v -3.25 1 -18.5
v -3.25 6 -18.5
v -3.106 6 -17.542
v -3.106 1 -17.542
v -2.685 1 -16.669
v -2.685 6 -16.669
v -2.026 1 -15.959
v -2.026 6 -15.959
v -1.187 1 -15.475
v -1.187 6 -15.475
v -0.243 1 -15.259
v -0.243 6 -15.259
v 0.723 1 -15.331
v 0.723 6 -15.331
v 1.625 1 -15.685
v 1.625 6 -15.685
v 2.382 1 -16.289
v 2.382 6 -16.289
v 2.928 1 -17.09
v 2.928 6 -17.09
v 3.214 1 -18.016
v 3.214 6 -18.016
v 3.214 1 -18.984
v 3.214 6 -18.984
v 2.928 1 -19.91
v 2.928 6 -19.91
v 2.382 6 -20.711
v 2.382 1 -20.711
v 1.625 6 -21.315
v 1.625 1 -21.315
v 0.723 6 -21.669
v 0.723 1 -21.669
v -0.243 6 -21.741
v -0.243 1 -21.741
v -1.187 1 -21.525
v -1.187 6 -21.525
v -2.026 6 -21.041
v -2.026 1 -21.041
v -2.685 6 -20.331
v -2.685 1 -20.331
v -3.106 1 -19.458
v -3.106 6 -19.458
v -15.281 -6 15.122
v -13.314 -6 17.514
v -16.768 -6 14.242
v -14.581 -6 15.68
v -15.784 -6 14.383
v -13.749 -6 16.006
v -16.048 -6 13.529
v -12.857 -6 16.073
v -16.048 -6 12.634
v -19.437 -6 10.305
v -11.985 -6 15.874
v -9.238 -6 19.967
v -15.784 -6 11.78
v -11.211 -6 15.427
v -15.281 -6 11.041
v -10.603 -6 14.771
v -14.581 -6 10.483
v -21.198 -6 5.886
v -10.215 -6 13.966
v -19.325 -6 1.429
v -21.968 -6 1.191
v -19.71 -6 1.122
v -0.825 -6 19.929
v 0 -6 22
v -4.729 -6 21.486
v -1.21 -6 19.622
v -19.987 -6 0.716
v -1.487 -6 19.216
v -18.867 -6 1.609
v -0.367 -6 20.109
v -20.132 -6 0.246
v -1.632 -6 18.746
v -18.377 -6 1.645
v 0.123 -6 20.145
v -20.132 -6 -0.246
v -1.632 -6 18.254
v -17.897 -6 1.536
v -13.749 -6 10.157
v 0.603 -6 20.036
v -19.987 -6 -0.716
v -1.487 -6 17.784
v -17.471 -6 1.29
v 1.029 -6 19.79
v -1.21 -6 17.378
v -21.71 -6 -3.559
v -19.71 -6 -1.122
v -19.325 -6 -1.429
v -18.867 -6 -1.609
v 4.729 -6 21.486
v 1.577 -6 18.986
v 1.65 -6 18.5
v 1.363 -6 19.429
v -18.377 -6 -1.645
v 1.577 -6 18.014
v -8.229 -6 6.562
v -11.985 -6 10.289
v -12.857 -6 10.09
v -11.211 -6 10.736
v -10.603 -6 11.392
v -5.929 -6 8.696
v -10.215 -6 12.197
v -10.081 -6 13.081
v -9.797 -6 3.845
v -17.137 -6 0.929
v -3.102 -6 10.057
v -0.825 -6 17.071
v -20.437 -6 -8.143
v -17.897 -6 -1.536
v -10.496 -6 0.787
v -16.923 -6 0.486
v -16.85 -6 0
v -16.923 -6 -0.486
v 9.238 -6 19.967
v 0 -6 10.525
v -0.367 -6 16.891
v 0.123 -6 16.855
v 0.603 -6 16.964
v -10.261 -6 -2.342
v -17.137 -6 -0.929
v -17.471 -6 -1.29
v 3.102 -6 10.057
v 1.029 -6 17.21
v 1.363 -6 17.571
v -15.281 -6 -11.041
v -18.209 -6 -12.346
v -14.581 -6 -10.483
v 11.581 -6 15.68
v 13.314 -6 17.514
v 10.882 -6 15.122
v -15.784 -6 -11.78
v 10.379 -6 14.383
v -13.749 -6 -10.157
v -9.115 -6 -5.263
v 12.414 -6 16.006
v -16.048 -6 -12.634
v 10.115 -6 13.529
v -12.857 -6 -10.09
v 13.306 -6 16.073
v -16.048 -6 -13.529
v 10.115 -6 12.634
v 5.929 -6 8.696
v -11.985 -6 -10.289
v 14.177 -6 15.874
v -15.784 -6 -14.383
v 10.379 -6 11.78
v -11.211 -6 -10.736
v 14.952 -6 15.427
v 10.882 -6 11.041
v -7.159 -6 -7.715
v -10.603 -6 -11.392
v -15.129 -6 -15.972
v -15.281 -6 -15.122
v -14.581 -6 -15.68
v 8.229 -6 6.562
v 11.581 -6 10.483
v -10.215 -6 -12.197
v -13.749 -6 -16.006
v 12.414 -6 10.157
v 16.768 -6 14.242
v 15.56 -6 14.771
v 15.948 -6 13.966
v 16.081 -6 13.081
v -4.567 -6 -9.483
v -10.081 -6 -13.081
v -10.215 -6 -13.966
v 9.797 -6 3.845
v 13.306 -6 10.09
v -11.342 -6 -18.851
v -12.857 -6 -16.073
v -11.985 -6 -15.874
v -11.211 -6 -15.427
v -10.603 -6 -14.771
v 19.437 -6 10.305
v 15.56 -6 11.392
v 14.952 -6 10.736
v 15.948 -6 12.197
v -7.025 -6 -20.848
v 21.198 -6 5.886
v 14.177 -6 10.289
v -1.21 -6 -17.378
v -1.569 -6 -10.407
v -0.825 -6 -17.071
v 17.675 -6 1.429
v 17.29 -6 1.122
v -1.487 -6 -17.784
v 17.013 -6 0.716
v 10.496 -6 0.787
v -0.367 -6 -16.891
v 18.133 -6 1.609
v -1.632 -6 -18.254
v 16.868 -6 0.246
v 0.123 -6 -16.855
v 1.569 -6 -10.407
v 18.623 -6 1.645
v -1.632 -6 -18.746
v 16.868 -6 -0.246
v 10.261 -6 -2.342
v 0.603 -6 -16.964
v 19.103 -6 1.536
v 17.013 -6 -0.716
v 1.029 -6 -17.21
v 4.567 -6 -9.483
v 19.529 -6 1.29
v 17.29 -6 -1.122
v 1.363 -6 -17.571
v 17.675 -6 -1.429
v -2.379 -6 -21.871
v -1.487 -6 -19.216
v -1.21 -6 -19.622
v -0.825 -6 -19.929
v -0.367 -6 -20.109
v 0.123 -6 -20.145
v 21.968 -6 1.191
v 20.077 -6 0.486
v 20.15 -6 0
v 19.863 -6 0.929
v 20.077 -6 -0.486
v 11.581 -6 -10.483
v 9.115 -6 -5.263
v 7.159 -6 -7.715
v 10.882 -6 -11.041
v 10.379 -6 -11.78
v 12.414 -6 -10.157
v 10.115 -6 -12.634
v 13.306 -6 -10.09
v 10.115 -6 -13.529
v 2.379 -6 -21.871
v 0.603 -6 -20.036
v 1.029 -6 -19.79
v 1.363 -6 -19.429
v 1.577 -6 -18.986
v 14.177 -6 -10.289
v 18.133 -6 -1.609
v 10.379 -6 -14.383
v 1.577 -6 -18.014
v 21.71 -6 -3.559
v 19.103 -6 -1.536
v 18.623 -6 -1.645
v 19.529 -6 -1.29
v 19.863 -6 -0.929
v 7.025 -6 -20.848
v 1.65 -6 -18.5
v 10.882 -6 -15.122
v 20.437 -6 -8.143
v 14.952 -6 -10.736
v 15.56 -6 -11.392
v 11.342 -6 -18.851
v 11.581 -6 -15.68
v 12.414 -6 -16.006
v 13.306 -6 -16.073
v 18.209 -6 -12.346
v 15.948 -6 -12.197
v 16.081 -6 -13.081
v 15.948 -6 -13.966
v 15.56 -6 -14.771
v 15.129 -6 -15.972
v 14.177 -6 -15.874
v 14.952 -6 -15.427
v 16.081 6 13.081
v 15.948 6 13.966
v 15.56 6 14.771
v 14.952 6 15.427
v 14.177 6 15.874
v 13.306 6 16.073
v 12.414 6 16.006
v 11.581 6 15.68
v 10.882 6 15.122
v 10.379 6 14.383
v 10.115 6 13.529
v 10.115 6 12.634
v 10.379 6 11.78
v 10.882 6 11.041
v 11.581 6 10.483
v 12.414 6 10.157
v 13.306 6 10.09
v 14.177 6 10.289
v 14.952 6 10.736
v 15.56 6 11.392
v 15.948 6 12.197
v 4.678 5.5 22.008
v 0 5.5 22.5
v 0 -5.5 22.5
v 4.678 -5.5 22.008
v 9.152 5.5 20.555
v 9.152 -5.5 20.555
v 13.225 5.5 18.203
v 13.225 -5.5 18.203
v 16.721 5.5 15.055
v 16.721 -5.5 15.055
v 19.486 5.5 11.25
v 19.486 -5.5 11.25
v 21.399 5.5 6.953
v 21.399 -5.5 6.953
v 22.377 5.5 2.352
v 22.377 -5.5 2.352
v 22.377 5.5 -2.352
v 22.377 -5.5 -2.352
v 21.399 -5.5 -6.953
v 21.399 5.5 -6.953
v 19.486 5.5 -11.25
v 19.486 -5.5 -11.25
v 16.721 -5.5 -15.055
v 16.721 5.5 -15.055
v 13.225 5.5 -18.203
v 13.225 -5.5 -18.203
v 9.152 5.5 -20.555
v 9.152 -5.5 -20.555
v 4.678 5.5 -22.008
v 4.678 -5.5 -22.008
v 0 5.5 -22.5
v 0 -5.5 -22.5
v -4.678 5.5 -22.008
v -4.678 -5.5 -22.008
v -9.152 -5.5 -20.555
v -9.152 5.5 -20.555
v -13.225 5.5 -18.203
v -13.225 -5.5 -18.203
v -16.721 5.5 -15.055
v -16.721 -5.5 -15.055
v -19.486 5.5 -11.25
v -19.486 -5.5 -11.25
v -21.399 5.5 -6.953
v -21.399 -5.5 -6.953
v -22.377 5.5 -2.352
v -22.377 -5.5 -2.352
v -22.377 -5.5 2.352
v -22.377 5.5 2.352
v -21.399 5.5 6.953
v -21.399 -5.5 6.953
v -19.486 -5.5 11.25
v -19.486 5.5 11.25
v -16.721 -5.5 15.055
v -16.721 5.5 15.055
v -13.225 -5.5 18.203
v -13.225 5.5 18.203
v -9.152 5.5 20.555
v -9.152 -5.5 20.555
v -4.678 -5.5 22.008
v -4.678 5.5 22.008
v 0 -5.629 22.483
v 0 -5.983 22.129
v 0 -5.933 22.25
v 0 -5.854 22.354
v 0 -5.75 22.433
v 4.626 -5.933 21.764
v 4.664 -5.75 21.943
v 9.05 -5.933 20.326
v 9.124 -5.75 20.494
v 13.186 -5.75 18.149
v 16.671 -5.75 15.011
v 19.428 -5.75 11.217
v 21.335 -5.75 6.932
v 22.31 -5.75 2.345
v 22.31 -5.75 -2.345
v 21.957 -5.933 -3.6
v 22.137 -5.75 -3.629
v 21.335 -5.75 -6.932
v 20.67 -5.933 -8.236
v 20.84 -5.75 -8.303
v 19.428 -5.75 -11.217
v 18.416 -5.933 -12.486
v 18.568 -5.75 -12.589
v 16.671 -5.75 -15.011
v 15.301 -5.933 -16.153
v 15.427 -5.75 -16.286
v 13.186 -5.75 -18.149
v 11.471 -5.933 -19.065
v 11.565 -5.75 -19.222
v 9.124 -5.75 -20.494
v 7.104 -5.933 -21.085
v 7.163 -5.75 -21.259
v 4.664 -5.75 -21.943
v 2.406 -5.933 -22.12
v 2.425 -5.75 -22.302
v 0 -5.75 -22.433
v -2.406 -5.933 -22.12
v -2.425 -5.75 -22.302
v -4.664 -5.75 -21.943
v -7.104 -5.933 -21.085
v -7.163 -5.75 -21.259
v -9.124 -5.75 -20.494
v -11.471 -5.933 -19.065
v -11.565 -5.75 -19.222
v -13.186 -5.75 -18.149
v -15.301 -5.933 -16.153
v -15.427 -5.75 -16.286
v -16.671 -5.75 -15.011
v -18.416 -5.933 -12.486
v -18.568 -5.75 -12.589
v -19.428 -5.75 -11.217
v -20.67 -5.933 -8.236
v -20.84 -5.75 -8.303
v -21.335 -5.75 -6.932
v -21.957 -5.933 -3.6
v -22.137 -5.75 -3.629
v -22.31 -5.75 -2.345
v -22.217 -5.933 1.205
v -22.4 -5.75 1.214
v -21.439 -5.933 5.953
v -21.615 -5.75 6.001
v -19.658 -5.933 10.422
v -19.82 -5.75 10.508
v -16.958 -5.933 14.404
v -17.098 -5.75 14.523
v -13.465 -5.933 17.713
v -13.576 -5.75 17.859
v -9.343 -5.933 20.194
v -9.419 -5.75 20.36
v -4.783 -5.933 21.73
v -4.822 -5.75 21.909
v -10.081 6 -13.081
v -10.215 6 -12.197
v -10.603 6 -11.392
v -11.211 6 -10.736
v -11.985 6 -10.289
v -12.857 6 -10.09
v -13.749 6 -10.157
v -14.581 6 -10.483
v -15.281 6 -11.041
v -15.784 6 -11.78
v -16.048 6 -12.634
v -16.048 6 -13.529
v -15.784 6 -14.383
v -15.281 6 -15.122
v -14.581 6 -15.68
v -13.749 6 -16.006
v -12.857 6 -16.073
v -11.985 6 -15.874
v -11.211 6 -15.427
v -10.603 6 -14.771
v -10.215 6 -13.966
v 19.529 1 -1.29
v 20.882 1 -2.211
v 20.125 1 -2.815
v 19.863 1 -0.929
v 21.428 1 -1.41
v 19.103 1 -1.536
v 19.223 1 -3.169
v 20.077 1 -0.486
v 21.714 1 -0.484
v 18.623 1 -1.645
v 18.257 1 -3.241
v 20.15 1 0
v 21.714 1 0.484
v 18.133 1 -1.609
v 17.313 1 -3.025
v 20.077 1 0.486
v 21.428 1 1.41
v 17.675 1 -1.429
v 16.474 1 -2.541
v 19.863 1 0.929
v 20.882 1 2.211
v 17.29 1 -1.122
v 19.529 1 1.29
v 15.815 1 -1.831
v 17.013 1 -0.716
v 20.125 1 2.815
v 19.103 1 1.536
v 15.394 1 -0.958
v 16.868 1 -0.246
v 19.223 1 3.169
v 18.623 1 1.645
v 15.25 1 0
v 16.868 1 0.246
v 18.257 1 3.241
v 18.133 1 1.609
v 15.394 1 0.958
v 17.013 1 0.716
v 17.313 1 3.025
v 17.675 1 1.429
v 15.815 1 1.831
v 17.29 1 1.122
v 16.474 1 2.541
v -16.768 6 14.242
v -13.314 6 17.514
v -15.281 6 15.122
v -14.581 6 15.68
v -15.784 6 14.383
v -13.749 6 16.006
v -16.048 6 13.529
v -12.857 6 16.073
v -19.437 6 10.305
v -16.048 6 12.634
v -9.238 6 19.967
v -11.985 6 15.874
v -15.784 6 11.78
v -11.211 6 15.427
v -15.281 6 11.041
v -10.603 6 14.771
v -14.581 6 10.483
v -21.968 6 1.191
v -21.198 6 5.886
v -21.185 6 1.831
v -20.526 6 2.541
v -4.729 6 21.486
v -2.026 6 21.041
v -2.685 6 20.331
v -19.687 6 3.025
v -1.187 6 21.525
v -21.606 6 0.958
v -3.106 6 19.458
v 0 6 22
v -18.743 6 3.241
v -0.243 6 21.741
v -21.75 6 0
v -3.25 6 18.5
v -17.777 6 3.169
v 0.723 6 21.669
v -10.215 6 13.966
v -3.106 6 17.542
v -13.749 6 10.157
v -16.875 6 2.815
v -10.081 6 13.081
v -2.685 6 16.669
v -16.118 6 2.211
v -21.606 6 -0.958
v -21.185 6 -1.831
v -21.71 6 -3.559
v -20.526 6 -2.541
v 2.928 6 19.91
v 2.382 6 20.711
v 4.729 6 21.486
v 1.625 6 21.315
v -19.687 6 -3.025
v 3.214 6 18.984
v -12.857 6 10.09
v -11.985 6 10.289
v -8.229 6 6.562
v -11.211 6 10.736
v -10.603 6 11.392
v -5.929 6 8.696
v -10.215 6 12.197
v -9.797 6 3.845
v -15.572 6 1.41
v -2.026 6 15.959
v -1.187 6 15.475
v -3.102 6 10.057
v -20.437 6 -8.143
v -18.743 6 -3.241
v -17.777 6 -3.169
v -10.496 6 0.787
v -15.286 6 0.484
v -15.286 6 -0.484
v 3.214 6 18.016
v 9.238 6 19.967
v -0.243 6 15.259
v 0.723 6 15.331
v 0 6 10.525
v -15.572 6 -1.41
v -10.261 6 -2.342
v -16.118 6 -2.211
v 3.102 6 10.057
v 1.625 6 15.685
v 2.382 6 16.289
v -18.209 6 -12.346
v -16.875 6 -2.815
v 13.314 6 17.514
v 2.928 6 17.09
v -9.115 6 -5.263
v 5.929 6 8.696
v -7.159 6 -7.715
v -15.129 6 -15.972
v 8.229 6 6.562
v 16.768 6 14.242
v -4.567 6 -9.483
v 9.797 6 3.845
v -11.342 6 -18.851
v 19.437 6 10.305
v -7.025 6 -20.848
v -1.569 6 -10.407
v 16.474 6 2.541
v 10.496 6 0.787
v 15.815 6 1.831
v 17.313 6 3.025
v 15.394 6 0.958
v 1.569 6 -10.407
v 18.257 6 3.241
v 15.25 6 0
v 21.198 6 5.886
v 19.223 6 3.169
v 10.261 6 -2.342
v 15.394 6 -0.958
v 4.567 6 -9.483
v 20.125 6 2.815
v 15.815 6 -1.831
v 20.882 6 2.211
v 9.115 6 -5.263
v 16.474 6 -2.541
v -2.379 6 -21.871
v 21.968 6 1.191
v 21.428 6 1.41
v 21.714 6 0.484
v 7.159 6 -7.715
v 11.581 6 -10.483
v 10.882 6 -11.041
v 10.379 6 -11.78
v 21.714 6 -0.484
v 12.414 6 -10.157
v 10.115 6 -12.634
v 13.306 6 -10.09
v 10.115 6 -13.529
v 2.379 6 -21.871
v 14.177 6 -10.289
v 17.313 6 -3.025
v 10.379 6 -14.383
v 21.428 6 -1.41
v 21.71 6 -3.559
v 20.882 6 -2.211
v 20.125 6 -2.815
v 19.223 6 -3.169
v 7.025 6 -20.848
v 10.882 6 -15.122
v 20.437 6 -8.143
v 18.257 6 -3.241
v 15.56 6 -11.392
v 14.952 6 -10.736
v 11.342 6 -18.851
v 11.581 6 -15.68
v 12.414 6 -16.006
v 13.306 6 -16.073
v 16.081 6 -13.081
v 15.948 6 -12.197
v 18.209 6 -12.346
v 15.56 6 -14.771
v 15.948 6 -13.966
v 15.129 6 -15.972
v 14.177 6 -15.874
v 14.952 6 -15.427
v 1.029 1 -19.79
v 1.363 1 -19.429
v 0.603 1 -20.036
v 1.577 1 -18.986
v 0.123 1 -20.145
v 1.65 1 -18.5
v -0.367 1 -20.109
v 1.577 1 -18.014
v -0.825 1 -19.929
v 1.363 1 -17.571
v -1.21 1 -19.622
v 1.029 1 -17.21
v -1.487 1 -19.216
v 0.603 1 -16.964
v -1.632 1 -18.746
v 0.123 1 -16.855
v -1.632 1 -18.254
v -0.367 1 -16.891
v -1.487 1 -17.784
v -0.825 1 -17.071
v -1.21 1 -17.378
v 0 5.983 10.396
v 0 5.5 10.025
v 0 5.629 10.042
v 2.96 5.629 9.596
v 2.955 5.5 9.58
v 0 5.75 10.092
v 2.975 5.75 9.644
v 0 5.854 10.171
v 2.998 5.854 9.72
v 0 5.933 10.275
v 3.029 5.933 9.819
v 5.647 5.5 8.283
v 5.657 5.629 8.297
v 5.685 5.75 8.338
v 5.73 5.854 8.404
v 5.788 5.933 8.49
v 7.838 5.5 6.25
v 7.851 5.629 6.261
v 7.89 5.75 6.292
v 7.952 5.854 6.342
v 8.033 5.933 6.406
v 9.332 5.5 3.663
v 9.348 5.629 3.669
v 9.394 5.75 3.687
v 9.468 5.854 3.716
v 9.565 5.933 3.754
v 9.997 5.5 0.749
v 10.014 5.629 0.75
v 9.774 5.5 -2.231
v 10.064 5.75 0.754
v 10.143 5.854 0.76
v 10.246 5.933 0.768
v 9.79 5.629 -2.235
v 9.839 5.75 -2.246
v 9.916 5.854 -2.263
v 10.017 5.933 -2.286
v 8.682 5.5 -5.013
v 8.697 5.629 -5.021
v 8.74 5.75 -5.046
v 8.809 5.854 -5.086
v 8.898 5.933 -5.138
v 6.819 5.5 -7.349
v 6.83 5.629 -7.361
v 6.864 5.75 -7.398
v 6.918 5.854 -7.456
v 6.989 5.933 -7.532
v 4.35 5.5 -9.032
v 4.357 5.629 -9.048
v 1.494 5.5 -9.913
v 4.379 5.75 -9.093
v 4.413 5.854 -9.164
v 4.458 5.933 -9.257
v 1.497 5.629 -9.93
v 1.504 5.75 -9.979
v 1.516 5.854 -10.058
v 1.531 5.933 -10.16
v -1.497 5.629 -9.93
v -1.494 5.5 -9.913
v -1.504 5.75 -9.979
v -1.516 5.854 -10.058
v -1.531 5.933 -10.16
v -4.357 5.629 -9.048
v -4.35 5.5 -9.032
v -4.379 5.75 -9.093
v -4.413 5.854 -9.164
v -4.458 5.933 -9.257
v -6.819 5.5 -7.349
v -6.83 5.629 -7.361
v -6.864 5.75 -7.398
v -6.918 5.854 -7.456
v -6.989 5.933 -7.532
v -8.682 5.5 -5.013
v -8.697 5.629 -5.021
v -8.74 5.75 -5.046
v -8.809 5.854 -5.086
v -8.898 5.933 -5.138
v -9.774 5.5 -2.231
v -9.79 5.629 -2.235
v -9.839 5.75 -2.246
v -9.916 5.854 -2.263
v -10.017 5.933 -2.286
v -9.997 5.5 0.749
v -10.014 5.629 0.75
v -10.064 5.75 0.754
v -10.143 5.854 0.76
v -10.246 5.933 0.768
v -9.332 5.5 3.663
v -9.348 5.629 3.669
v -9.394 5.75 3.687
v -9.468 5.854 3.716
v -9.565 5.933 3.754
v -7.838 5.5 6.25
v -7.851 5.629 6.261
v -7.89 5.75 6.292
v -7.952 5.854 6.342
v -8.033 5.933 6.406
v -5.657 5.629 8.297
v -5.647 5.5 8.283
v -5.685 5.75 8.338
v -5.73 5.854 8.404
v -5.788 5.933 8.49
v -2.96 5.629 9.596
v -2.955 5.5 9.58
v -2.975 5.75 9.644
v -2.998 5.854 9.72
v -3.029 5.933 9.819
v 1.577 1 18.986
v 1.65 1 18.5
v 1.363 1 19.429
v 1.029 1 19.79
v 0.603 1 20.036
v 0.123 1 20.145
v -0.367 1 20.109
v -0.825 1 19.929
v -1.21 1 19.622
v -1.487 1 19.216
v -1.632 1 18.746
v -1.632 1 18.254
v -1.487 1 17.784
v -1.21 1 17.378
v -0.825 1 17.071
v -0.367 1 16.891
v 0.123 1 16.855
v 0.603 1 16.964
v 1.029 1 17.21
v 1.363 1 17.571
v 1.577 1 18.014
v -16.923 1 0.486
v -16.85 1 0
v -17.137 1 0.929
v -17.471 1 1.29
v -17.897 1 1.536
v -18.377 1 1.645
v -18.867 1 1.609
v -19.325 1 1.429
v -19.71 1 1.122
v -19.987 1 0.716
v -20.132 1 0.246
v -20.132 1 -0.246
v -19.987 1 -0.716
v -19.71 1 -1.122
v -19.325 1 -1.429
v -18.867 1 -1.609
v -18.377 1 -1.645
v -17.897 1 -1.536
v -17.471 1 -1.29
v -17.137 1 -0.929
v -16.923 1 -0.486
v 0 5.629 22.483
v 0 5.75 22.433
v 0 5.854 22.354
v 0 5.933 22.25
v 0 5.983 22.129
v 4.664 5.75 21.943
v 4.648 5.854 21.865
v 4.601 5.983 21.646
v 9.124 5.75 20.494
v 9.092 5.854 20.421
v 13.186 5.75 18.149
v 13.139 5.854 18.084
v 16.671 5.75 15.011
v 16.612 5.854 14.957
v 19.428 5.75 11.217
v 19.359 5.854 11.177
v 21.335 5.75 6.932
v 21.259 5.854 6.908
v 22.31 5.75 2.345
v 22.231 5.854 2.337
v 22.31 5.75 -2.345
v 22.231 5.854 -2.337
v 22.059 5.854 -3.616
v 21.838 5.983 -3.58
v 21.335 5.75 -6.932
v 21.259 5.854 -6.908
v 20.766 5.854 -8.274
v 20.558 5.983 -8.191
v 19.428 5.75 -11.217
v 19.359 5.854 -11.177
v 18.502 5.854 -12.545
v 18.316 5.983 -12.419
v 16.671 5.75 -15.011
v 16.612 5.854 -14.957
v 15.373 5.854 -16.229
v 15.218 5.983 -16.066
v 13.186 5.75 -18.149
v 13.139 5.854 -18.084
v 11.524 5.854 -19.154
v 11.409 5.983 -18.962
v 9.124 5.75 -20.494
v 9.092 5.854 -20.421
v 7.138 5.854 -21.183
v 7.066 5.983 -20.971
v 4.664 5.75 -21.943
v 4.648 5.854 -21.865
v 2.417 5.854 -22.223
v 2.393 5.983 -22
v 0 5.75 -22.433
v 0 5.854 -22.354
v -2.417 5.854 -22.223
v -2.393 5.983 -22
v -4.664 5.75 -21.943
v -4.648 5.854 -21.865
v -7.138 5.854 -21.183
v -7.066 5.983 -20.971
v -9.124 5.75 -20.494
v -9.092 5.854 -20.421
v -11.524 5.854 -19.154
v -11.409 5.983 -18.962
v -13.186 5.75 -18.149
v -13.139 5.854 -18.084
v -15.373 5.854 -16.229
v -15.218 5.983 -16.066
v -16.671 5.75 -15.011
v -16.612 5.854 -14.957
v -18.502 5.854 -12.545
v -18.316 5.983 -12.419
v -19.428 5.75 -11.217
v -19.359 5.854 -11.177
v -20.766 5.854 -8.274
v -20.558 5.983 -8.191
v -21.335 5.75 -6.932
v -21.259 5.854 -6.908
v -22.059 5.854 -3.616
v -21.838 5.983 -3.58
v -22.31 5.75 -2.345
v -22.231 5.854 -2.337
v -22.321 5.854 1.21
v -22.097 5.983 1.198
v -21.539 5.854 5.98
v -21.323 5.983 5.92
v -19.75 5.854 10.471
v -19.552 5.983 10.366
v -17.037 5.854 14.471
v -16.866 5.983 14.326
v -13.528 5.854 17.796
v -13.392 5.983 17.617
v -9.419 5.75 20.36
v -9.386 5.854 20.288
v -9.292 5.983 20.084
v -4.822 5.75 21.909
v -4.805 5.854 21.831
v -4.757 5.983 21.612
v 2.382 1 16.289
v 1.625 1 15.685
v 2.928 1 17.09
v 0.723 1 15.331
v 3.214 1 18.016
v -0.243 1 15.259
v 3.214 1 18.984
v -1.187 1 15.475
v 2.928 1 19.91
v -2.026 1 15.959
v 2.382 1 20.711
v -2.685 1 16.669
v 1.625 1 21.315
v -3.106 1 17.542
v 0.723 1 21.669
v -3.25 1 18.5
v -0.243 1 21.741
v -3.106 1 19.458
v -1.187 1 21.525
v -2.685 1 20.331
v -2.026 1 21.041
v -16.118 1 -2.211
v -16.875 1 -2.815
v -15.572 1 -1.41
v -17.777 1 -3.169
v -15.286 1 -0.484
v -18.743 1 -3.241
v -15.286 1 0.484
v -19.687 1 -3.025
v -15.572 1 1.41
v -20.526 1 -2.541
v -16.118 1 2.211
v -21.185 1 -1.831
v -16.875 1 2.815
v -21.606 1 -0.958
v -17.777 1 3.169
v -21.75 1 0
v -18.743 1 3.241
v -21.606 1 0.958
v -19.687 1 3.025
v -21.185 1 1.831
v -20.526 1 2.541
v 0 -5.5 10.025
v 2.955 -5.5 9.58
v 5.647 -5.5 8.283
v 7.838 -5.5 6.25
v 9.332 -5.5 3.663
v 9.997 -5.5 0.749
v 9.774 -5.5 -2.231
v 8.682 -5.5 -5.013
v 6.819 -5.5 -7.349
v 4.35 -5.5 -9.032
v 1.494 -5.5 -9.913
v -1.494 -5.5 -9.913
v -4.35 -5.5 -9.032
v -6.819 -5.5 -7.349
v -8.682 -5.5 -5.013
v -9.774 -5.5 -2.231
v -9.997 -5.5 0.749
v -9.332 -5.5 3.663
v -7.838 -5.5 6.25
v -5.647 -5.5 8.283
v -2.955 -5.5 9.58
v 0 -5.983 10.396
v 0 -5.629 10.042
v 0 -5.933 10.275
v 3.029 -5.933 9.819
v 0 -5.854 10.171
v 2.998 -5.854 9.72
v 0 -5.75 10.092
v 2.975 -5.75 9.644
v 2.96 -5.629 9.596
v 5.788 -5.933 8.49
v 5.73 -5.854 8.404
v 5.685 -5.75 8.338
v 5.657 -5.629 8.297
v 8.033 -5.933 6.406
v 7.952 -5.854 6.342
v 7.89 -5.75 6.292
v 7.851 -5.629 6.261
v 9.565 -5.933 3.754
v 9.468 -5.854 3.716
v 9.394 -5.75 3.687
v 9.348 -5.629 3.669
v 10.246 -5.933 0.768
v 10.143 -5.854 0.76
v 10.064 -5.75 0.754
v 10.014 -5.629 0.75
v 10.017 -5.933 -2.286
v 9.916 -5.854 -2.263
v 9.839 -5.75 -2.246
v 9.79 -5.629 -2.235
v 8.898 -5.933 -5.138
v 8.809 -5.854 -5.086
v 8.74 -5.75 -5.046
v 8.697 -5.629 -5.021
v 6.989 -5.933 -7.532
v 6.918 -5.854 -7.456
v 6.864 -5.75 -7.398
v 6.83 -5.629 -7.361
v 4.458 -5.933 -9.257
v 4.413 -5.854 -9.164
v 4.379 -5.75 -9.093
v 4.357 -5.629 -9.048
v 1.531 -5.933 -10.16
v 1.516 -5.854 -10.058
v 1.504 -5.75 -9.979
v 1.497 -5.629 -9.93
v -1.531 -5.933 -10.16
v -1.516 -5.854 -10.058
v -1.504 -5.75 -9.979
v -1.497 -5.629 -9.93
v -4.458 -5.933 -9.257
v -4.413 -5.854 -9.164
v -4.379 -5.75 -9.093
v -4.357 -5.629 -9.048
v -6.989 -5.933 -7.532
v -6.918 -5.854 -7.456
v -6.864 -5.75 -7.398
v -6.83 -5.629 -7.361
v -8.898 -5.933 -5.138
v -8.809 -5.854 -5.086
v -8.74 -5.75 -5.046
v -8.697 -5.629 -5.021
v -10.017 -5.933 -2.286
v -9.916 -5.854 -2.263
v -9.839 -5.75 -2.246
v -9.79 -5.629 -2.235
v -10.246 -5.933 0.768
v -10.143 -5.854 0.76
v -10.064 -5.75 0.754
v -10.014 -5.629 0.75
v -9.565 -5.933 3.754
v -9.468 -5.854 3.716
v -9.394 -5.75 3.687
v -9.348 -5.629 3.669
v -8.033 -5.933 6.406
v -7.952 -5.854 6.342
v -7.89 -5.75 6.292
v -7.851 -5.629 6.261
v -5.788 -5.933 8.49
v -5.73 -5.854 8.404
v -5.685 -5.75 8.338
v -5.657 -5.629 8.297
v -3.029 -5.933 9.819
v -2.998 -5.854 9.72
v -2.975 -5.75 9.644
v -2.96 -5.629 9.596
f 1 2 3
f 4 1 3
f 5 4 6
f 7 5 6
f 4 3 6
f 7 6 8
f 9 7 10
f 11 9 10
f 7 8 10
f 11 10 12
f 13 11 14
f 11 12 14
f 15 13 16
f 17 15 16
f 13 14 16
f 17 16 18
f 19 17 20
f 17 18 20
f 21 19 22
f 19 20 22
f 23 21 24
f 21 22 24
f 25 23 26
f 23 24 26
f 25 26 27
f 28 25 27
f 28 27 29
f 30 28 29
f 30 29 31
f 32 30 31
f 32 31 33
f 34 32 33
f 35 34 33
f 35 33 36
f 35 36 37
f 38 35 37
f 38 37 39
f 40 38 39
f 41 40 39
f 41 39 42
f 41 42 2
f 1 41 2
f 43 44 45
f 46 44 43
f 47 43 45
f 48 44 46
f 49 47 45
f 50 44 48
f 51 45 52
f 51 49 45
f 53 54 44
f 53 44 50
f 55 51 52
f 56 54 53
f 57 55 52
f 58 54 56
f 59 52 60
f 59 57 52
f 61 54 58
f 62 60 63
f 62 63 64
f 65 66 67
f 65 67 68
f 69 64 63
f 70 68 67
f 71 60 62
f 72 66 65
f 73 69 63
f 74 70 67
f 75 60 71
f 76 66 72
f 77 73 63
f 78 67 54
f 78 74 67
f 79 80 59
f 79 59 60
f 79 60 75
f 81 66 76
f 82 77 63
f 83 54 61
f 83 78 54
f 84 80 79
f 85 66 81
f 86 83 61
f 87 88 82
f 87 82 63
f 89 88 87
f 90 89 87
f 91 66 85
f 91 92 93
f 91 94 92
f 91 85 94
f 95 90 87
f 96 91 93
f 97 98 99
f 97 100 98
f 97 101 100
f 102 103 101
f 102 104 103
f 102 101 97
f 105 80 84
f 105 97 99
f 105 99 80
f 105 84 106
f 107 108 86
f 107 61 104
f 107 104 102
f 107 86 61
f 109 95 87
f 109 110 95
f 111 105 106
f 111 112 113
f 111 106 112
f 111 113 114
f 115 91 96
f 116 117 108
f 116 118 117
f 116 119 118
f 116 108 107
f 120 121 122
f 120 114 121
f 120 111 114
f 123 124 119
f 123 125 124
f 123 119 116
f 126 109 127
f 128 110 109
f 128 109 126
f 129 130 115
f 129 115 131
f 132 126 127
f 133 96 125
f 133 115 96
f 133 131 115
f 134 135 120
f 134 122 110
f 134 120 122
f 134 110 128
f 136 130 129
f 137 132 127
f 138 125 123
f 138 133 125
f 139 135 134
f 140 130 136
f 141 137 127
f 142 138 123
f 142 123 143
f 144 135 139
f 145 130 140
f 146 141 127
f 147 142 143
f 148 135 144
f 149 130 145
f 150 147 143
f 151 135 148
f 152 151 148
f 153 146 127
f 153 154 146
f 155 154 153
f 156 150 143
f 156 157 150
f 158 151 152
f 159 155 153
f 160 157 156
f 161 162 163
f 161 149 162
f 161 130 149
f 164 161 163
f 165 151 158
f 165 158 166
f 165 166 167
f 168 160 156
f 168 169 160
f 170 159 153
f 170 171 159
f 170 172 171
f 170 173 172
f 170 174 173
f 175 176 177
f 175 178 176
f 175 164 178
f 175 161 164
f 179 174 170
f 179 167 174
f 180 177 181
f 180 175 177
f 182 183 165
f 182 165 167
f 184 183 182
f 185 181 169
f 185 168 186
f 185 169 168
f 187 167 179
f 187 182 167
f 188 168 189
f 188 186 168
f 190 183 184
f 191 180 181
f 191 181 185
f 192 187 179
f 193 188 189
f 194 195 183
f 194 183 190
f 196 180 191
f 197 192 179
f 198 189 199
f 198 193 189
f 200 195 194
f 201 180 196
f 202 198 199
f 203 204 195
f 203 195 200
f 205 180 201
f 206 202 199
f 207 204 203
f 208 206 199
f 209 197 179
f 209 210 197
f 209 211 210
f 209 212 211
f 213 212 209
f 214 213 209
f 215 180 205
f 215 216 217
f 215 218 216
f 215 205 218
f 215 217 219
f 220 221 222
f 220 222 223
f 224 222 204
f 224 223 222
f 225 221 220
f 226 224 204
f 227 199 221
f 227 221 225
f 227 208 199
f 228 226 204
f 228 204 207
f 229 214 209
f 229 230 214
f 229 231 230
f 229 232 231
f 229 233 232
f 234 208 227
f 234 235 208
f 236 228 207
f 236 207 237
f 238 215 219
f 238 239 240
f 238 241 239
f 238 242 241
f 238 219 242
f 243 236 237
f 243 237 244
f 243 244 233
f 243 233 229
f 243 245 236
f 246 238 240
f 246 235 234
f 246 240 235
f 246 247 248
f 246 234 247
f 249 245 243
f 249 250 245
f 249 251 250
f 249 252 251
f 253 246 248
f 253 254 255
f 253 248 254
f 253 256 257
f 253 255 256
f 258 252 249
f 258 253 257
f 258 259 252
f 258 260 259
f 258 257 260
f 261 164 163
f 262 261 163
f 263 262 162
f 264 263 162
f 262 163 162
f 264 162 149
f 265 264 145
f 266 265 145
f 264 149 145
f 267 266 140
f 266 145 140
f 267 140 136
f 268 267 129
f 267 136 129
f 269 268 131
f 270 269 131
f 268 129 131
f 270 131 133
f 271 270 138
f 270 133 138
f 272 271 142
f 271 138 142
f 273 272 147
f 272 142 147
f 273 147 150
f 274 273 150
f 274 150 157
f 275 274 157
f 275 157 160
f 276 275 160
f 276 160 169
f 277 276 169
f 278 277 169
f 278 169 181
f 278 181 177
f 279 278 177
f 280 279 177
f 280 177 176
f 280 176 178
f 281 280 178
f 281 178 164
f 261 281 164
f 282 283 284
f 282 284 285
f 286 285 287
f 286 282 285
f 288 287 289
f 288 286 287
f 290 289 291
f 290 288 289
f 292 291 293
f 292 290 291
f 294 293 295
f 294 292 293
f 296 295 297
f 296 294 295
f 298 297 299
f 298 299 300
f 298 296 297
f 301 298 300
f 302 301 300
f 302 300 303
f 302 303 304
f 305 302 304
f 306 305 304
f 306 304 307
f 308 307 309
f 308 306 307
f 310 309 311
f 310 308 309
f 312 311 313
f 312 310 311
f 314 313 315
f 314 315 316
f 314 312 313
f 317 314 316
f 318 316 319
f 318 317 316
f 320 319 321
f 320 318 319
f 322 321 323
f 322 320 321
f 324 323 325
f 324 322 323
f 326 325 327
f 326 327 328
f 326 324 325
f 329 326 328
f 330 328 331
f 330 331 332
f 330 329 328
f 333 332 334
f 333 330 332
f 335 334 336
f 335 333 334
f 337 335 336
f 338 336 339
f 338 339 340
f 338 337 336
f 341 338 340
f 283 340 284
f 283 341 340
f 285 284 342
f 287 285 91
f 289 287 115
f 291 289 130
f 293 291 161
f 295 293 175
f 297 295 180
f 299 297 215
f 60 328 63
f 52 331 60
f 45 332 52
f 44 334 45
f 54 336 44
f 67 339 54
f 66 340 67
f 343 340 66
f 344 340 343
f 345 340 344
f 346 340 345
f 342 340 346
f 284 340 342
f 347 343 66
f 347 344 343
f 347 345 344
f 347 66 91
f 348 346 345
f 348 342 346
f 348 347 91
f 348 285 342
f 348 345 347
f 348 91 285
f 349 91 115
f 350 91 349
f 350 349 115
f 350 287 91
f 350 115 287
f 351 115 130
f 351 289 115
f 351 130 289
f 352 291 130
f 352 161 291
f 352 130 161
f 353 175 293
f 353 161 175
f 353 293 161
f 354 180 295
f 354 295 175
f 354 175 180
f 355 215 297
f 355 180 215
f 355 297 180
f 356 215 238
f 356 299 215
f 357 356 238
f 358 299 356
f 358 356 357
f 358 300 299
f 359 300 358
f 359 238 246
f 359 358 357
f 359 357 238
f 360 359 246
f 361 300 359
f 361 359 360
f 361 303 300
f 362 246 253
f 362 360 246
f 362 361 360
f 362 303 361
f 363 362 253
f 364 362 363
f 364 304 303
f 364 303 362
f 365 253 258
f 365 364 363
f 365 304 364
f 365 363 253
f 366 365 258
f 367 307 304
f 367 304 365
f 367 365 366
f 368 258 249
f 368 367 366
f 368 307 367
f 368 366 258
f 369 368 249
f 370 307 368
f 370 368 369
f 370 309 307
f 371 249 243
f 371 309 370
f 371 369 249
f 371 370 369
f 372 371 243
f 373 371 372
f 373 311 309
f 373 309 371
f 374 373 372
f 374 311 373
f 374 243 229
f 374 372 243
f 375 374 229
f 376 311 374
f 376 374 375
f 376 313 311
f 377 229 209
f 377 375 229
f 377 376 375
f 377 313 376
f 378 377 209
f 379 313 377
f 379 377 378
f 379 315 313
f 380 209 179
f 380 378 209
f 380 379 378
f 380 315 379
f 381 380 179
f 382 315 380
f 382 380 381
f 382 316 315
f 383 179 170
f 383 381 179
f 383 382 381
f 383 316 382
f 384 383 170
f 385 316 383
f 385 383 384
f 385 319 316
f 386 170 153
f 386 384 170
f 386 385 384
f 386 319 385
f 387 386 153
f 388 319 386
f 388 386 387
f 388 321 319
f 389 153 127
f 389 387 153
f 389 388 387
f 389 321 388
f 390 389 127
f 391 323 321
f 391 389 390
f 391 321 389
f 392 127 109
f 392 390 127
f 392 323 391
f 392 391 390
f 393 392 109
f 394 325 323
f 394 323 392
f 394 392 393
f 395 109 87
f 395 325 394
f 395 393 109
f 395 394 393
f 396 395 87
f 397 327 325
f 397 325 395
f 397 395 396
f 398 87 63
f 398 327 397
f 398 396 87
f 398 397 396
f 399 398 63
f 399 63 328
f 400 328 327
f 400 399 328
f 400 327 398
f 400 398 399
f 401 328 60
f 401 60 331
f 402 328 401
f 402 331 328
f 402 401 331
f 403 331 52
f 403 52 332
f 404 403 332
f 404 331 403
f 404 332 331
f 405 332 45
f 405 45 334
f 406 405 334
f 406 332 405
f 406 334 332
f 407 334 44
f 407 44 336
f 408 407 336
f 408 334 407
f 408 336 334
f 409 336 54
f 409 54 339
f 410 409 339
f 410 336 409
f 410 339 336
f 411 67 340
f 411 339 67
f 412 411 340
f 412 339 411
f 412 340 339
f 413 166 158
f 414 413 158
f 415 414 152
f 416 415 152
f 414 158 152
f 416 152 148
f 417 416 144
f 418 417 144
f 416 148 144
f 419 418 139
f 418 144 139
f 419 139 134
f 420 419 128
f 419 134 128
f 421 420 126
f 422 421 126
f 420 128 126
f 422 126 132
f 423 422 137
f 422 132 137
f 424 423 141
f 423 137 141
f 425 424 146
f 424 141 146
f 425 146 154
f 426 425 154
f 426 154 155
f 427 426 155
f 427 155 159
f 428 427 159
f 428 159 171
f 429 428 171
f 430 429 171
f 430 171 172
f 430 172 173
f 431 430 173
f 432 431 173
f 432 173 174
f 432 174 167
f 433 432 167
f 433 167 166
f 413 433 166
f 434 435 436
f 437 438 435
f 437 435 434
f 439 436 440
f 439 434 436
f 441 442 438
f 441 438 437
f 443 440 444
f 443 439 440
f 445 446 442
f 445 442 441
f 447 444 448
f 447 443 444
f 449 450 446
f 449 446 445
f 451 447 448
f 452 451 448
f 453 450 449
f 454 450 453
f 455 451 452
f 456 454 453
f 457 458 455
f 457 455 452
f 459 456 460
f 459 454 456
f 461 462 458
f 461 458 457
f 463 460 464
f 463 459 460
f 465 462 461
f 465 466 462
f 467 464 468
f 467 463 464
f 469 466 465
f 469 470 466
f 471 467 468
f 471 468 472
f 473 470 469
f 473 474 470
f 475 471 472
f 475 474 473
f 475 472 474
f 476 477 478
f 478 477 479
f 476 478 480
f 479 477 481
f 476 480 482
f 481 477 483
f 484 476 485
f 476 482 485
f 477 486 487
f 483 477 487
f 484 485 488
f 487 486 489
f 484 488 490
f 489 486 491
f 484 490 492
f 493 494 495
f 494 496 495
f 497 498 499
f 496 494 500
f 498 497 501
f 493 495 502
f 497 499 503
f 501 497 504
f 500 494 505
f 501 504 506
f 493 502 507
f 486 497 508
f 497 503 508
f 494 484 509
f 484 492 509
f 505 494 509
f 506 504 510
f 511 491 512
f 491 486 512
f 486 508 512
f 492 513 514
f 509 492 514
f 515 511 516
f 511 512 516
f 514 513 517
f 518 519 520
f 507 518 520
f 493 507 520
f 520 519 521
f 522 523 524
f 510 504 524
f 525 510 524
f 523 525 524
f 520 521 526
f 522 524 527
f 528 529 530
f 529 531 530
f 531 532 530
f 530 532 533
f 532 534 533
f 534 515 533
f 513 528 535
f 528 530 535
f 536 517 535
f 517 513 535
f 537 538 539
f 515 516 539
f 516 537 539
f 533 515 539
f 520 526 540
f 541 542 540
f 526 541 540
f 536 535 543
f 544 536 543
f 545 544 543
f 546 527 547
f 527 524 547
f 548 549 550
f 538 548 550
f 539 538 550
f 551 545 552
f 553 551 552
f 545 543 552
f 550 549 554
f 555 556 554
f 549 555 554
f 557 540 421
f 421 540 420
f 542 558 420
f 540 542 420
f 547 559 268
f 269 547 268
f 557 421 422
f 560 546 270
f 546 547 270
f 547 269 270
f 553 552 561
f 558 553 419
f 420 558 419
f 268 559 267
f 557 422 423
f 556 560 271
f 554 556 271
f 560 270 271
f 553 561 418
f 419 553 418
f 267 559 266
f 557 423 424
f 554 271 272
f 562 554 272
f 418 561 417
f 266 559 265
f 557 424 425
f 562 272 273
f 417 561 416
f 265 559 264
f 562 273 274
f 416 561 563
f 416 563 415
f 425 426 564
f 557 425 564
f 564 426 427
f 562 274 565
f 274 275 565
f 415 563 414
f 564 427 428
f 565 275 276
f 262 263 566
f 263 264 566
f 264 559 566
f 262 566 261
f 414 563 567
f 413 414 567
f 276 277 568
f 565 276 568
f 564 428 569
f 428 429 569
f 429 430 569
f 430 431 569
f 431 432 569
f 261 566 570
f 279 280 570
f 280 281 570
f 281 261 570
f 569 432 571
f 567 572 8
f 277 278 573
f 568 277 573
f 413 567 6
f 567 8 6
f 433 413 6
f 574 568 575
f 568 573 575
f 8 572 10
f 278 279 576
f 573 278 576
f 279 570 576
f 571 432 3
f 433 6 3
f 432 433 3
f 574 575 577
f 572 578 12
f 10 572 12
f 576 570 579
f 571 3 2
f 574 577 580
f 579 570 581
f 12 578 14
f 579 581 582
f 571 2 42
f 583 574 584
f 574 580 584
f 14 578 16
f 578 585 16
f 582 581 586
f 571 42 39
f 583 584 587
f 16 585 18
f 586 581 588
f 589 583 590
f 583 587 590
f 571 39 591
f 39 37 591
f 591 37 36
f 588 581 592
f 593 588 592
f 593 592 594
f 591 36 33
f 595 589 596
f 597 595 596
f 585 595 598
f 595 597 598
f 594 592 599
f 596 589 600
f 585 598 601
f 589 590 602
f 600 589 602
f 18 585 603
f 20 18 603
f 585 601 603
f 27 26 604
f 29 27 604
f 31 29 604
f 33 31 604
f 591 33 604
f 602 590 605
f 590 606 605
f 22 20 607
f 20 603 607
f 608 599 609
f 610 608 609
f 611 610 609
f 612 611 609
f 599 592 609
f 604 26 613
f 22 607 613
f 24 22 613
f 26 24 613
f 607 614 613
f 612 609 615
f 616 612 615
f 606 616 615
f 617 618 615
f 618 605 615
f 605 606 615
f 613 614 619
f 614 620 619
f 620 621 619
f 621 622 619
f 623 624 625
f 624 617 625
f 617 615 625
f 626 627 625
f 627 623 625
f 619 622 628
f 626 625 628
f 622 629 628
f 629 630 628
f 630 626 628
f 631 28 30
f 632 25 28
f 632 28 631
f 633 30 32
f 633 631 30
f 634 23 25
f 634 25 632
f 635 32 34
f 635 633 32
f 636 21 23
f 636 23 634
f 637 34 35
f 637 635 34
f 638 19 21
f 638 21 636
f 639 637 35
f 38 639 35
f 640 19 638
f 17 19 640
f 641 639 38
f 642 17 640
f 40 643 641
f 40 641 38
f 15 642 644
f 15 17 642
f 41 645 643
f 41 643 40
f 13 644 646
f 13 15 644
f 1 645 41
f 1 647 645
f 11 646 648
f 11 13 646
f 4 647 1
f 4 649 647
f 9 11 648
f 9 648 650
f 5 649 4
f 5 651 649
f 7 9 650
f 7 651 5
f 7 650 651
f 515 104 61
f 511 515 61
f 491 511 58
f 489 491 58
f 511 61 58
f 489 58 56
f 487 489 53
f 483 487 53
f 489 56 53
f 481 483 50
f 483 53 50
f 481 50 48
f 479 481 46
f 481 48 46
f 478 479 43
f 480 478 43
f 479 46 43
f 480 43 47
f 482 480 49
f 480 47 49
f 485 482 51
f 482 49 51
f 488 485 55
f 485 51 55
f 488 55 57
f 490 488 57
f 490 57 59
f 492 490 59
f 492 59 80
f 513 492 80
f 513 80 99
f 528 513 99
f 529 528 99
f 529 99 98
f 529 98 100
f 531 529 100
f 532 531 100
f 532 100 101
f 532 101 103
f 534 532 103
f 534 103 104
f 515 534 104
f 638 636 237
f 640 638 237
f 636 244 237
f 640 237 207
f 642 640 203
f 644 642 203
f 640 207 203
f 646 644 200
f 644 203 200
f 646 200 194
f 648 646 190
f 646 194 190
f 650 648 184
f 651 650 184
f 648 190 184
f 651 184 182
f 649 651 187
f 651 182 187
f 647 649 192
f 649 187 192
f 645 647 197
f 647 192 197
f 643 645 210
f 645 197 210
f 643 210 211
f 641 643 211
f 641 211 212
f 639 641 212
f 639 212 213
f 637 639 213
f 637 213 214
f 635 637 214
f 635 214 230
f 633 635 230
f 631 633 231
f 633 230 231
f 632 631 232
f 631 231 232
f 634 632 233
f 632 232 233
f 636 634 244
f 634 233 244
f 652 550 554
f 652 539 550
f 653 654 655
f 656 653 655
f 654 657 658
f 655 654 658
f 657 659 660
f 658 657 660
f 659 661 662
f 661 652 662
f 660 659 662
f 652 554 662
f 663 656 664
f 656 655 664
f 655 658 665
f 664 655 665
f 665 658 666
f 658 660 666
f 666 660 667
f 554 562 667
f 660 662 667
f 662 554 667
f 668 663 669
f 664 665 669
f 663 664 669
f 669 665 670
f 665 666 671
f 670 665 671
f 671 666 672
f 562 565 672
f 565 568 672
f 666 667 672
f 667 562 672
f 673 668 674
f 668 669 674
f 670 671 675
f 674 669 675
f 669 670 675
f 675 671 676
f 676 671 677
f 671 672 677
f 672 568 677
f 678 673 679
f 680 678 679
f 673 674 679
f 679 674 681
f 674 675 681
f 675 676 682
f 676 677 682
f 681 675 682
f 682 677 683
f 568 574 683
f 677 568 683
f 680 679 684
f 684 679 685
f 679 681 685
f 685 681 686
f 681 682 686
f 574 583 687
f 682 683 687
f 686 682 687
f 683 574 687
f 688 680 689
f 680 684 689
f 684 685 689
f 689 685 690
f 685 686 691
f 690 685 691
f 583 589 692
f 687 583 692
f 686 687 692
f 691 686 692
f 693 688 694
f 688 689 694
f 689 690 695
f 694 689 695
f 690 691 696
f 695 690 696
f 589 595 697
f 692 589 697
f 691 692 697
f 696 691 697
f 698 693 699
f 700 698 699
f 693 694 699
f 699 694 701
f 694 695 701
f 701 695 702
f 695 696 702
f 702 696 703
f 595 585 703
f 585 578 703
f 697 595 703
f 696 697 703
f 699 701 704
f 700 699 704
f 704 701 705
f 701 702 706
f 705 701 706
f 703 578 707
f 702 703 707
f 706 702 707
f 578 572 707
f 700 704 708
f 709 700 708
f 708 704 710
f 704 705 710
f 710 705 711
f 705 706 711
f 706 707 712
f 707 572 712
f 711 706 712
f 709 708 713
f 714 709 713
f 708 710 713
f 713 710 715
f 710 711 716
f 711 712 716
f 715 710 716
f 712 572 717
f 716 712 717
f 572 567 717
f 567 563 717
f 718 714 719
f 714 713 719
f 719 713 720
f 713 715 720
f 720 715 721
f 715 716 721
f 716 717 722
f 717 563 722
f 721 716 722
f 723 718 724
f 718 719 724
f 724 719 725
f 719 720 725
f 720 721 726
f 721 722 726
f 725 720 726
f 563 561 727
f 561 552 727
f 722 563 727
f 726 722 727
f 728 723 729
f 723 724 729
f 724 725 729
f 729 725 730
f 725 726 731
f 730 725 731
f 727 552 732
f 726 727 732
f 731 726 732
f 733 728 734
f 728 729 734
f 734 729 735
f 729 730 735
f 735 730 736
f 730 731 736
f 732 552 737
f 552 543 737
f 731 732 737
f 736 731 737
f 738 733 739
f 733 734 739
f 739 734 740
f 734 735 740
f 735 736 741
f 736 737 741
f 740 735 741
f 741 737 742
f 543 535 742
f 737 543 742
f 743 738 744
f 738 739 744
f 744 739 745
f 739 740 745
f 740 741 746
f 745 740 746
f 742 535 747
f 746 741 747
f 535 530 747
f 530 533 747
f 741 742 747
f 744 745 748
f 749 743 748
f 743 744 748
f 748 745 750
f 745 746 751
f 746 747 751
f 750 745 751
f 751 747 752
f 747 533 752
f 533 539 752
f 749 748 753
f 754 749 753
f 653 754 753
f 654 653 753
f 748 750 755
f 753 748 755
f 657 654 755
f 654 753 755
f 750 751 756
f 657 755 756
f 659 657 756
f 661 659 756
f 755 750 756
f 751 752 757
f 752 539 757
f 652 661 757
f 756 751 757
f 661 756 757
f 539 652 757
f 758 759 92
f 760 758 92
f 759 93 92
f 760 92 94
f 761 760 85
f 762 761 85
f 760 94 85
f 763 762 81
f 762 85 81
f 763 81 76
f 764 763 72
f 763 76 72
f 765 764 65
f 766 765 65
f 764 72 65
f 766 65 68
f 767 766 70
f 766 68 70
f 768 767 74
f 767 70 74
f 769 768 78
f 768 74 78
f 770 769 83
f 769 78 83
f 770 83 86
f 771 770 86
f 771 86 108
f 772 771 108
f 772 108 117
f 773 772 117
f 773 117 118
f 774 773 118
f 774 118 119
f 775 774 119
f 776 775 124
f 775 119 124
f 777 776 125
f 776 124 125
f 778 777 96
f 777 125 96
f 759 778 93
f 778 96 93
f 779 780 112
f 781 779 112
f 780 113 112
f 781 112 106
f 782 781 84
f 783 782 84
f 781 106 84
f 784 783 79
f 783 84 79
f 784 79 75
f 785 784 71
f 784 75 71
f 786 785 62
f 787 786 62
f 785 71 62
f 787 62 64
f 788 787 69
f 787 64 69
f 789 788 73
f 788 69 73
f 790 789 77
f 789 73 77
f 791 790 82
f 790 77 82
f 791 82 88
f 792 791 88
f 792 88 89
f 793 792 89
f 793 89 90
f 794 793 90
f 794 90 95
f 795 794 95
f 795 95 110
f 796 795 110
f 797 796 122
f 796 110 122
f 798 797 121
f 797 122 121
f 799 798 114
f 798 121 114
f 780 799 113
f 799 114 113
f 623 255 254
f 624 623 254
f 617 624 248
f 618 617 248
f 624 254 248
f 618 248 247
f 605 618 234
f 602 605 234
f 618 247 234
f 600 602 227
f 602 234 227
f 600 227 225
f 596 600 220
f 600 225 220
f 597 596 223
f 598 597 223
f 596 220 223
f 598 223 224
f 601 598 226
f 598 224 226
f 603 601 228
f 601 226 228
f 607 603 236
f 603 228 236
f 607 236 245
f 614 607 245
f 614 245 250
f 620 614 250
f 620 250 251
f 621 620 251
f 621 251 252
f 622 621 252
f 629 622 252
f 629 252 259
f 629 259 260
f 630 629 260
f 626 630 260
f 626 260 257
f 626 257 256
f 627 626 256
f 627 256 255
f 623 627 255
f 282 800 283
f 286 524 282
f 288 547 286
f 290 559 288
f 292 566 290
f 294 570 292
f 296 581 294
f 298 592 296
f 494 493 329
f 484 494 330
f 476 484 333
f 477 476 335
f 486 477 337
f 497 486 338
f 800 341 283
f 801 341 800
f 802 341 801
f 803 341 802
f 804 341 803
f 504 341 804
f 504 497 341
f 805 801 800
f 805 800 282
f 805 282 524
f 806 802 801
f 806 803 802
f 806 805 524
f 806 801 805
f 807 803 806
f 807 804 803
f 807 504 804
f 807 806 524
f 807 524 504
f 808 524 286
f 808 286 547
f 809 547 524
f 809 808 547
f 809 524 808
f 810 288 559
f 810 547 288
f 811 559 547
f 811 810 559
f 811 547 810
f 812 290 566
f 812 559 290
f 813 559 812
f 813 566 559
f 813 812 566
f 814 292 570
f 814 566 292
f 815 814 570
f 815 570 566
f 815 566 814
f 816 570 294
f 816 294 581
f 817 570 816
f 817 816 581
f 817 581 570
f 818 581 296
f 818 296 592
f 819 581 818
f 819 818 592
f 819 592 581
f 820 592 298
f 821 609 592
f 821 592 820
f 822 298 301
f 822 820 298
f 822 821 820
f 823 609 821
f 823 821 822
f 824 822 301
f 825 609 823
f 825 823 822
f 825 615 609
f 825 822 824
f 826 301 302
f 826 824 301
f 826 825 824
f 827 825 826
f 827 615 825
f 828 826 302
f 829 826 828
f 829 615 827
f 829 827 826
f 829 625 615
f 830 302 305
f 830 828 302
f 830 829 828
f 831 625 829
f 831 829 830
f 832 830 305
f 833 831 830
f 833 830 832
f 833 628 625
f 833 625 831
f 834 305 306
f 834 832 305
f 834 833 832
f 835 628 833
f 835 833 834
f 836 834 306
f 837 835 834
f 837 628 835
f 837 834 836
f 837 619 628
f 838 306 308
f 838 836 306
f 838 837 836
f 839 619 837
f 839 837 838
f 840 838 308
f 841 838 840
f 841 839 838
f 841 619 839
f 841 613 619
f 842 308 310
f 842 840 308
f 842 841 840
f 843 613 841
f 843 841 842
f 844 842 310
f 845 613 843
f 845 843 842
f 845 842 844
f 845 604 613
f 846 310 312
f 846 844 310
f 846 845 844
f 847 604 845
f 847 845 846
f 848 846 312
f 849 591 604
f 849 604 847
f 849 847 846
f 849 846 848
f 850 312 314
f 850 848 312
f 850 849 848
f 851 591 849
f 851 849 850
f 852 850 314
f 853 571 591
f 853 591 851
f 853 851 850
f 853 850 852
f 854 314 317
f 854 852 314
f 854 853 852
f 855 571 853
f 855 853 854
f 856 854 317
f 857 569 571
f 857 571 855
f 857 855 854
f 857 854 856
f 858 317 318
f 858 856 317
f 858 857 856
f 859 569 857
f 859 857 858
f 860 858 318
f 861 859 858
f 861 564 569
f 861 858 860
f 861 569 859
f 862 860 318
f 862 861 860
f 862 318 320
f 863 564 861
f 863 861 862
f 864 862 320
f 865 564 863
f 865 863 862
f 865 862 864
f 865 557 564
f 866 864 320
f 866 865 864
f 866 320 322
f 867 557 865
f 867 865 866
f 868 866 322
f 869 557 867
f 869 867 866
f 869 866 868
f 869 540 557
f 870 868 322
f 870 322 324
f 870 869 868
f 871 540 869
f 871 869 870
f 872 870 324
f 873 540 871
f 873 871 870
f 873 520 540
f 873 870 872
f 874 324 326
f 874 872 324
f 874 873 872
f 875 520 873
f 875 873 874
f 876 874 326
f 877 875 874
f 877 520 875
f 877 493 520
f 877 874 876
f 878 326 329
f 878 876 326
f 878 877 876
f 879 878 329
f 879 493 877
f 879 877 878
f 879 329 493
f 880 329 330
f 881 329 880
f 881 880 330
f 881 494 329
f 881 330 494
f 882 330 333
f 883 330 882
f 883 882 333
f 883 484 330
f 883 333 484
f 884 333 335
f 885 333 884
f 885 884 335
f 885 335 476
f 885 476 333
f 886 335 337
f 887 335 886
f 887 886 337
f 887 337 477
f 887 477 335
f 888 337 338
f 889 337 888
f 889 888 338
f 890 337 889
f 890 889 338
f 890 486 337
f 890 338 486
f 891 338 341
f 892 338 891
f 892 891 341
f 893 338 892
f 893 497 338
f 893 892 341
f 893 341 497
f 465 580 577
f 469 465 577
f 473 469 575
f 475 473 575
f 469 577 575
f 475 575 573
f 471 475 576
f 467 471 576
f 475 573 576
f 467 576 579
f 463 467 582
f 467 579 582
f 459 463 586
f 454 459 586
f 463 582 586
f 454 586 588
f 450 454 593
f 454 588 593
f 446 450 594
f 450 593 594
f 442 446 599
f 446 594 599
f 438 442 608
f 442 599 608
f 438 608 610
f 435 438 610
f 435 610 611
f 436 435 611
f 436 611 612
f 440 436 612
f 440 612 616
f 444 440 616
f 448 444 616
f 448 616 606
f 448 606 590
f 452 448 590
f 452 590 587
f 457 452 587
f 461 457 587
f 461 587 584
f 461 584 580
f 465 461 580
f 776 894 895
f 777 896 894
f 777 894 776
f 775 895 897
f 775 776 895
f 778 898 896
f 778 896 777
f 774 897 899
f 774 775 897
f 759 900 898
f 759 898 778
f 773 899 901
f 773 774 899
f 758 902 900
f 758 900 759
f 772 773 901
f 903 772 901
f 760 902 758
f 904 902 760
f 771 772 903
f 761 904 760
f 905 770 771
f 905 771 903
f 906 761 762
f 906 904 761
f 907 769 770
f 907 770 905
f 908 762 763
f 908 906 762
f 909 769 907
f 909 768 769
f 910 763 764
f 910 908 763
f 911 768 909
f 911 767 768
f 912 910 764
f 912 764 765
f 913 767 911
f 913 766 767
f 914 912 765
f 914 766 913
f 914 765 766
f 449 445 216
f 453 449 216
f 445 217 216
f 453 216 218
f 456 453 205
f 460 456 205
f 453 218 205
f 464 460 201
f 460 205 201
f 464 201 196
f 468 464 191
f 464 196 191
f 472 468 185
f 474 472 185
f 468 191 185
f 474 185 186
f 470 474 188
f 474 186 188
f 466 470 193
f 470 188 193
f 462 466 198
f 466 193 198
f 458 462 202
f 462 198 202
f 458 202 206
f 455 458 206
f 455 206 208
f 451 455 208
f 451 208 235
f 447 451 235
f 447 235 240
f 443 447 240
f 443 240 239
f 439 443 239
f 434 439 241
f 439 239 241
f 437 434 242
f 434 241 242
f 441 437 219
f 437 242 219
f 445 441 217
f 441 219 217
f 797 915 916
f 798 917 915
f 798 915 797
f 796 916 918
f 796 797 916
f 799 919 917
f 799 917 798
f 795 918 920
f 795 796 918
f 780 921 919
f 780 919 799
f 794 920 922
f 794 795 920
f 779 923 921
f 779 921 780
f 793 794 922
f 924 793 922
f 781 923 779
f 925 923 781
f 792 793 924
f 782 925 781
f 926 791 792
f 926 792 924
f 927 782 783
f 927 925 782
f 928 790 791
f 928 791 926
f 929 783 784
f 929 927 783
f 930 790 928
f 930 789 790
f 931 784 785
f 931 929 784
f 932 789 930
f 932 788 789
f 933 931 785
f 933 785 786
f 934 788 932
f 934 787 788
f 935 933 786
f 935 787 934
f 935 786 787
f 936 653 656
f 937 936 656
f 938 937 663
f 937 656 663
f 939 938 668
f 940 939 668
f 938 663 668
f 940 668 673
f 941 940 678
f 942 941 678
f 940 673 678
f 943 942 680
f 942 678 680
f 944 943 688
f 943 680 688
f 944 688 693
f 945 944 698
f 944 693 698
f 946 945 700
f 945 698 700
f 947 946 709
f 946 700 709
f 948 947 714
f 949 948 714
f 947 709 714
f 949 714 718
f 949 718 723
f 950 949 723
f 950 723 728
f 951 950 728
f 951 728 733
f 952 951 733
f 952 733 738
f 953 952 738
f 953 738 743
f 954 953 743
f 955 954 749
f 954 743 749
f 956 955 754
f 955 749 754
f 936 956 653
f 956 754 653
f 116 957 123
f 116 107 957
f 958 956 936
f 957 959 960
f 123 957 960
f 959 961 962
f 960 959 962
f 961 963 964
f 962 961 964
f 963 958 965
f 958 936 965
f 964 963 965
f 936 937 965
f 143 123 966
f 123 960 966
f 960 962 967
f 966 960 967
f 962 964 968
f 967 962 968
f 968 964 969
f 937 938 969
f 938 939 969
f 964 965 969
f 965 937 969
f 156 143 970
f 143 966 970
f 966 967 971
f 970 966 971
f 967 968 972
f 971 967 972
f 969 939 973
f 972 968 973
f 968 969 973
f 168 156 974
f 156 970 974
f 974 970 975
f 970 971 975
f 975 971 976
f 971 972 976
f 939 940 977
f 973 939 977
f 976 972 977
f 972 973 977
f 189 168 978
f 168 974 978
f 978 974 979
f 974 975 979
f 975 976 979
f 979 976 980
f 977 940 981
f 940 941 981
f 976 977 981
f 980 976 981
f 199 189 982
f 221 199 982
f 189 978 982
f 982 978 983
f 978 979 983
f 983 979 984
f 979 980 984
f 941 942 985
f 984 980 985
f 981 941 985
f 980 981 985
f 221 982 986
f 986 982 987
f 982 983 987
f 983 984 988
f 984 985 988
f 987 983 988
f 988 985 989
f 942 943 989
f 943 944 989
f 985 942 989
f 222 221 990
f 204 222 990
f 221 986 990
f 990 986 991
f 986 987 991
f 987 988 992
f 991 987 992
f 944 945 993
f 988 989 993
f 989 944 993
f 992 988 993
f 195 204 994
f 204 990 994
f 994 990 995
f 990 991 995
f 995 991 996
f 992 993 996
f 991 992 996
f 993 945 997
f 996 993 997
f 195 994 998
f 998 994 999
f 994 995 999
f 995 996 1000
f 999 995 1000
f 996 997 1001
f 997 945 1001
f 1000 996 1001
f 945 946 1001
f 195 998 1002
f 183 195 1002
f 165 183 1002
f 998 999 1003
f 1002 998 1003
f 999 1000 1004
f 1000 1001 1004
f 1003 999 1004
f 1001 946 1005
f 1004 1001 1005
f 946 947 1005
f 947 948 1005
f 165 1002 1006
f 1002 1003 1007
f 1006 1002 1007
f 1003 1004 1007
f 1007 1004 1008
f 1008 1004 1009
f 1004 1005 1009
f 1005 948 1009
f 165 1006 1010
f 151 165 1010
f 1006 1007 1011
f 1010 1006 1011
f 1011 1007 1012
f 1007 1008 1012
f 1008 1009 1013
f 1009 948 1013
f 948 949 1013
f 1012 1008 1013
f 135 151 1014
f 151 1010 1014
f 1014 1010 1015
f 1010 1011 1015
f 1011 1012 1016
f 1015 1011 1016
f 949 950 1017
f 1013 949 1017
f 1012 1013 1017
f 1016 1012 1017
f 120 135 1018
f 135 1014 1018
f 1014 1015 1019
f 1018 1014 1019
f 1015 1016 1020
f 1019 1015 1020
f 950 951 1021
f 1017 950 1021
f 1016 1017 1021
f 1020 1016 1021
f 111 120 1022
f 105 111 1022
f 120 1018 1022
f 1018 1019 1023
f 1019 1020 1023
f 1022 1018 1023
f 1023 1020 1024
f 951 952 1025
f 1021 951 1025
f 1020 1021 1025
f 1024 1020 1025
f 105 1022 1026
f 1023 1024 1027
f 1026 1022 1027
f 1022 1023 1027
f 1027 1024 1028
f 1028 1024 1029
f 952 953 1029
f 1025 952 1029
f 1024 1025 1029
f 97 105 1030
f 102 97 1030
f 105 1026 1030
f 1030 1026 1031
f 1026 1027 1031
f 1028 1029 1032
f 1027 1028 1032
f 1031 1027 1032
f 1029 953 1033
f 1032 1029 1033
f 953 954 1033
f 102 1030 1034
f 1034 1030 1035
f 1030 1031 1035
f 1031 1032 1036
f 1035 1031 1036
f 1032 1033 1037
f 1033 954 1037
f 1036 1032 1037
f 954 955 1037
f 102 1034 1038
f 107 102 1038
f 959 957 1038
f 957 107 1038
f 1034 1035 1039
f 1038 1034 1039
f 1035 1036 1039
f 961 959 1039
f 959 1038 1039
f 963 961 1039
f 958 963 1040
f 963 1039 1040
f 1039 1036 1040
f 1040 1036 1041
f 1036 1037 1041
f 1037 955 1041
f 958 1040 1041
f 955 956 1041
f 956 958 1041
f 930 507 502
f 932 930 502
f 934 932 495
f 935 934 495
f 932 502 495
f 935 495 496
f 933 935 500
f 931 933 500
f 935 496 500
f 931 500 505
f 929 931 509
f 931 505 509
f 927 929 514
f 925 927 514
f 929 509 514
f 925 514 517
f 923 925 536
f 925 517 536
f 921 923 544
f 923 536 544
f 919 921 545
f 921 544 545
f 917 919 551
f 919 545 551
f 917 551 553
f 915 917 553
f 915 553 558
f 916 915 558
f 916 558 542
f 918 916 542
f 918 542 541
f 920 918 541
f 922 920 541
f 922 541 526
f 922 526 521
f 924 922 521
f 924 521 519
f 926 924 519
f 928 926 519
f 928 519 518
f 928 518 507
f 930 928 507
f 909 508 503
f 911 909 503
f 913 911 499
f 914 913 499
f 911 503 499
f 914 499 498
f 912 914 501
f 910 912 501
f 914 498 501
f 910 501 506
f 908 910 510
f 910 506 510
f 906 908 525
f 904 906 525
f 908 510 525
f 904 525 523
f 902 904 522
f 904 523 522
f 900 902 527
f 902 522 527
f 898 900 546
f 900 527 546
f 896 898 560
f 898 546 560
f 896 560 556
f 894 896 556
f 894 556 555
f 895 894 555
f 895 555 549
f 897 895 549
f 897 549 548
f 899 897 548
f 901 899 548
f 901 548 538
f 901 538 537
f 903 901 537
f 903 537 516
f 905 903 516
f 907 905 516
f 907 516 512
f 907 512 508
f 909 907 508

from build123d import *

# Parameters (mm, degrees)
F0_W           = 12
F0_H           = 12.475
F3_D           = 6
F4_D           = 3.3
F4_CBORE_D     = 6.5
F4_CBORE_DEPTH = 5
F5_R           = 0.5


with BuildPart() as f1:
    # F0 (on Right) → F1 (revolve)
    with BuildSketch(Plane.YZ):
        with Locations((0, 16.2625)):
            Rectangle(F0_W, F0_H)
    revolve(axis=Axis((0, 1.880541, 0), (0, 1, 0)))

    # F3 (through all)
    with Locations(Plane(origin=(0, 6, 0), x_dir=(-1, 0, 0), z_dir=(0, 1, 0))):
        with Locations((-13.081475, 13.081475), (13.081475, 13.081475), (-13.081475, -13.081475), (13.081475, -13.081475)):
            Hole(F3_D / 2)

    # F4 (through all)
    with Locations(Plane(origin=(0, 6, 0), x_dir=(-1, 0, 0), z_dir=(0, 1, 0))):
        with Locations((-18.5, 0), (0, -18.5), (18.5, 0), (0, 18.5)):
            CounterBoreHole(F4_D / 2, F4_CBORE_D / 2, F4_CBORE_DEPTH)

    # F5
    f5_edges = [f1.edges().sort_by_distance(p)[0] for p in [
        (0, 6, -22.5),
        (0, -6, -22.5),
        (0, 6, -10.025),
        (0, -6, -10.025),
        (0, 0, 10.025),
    ]]
    fillet(f5_edges, radius=F5_R)


solid = f1.part
